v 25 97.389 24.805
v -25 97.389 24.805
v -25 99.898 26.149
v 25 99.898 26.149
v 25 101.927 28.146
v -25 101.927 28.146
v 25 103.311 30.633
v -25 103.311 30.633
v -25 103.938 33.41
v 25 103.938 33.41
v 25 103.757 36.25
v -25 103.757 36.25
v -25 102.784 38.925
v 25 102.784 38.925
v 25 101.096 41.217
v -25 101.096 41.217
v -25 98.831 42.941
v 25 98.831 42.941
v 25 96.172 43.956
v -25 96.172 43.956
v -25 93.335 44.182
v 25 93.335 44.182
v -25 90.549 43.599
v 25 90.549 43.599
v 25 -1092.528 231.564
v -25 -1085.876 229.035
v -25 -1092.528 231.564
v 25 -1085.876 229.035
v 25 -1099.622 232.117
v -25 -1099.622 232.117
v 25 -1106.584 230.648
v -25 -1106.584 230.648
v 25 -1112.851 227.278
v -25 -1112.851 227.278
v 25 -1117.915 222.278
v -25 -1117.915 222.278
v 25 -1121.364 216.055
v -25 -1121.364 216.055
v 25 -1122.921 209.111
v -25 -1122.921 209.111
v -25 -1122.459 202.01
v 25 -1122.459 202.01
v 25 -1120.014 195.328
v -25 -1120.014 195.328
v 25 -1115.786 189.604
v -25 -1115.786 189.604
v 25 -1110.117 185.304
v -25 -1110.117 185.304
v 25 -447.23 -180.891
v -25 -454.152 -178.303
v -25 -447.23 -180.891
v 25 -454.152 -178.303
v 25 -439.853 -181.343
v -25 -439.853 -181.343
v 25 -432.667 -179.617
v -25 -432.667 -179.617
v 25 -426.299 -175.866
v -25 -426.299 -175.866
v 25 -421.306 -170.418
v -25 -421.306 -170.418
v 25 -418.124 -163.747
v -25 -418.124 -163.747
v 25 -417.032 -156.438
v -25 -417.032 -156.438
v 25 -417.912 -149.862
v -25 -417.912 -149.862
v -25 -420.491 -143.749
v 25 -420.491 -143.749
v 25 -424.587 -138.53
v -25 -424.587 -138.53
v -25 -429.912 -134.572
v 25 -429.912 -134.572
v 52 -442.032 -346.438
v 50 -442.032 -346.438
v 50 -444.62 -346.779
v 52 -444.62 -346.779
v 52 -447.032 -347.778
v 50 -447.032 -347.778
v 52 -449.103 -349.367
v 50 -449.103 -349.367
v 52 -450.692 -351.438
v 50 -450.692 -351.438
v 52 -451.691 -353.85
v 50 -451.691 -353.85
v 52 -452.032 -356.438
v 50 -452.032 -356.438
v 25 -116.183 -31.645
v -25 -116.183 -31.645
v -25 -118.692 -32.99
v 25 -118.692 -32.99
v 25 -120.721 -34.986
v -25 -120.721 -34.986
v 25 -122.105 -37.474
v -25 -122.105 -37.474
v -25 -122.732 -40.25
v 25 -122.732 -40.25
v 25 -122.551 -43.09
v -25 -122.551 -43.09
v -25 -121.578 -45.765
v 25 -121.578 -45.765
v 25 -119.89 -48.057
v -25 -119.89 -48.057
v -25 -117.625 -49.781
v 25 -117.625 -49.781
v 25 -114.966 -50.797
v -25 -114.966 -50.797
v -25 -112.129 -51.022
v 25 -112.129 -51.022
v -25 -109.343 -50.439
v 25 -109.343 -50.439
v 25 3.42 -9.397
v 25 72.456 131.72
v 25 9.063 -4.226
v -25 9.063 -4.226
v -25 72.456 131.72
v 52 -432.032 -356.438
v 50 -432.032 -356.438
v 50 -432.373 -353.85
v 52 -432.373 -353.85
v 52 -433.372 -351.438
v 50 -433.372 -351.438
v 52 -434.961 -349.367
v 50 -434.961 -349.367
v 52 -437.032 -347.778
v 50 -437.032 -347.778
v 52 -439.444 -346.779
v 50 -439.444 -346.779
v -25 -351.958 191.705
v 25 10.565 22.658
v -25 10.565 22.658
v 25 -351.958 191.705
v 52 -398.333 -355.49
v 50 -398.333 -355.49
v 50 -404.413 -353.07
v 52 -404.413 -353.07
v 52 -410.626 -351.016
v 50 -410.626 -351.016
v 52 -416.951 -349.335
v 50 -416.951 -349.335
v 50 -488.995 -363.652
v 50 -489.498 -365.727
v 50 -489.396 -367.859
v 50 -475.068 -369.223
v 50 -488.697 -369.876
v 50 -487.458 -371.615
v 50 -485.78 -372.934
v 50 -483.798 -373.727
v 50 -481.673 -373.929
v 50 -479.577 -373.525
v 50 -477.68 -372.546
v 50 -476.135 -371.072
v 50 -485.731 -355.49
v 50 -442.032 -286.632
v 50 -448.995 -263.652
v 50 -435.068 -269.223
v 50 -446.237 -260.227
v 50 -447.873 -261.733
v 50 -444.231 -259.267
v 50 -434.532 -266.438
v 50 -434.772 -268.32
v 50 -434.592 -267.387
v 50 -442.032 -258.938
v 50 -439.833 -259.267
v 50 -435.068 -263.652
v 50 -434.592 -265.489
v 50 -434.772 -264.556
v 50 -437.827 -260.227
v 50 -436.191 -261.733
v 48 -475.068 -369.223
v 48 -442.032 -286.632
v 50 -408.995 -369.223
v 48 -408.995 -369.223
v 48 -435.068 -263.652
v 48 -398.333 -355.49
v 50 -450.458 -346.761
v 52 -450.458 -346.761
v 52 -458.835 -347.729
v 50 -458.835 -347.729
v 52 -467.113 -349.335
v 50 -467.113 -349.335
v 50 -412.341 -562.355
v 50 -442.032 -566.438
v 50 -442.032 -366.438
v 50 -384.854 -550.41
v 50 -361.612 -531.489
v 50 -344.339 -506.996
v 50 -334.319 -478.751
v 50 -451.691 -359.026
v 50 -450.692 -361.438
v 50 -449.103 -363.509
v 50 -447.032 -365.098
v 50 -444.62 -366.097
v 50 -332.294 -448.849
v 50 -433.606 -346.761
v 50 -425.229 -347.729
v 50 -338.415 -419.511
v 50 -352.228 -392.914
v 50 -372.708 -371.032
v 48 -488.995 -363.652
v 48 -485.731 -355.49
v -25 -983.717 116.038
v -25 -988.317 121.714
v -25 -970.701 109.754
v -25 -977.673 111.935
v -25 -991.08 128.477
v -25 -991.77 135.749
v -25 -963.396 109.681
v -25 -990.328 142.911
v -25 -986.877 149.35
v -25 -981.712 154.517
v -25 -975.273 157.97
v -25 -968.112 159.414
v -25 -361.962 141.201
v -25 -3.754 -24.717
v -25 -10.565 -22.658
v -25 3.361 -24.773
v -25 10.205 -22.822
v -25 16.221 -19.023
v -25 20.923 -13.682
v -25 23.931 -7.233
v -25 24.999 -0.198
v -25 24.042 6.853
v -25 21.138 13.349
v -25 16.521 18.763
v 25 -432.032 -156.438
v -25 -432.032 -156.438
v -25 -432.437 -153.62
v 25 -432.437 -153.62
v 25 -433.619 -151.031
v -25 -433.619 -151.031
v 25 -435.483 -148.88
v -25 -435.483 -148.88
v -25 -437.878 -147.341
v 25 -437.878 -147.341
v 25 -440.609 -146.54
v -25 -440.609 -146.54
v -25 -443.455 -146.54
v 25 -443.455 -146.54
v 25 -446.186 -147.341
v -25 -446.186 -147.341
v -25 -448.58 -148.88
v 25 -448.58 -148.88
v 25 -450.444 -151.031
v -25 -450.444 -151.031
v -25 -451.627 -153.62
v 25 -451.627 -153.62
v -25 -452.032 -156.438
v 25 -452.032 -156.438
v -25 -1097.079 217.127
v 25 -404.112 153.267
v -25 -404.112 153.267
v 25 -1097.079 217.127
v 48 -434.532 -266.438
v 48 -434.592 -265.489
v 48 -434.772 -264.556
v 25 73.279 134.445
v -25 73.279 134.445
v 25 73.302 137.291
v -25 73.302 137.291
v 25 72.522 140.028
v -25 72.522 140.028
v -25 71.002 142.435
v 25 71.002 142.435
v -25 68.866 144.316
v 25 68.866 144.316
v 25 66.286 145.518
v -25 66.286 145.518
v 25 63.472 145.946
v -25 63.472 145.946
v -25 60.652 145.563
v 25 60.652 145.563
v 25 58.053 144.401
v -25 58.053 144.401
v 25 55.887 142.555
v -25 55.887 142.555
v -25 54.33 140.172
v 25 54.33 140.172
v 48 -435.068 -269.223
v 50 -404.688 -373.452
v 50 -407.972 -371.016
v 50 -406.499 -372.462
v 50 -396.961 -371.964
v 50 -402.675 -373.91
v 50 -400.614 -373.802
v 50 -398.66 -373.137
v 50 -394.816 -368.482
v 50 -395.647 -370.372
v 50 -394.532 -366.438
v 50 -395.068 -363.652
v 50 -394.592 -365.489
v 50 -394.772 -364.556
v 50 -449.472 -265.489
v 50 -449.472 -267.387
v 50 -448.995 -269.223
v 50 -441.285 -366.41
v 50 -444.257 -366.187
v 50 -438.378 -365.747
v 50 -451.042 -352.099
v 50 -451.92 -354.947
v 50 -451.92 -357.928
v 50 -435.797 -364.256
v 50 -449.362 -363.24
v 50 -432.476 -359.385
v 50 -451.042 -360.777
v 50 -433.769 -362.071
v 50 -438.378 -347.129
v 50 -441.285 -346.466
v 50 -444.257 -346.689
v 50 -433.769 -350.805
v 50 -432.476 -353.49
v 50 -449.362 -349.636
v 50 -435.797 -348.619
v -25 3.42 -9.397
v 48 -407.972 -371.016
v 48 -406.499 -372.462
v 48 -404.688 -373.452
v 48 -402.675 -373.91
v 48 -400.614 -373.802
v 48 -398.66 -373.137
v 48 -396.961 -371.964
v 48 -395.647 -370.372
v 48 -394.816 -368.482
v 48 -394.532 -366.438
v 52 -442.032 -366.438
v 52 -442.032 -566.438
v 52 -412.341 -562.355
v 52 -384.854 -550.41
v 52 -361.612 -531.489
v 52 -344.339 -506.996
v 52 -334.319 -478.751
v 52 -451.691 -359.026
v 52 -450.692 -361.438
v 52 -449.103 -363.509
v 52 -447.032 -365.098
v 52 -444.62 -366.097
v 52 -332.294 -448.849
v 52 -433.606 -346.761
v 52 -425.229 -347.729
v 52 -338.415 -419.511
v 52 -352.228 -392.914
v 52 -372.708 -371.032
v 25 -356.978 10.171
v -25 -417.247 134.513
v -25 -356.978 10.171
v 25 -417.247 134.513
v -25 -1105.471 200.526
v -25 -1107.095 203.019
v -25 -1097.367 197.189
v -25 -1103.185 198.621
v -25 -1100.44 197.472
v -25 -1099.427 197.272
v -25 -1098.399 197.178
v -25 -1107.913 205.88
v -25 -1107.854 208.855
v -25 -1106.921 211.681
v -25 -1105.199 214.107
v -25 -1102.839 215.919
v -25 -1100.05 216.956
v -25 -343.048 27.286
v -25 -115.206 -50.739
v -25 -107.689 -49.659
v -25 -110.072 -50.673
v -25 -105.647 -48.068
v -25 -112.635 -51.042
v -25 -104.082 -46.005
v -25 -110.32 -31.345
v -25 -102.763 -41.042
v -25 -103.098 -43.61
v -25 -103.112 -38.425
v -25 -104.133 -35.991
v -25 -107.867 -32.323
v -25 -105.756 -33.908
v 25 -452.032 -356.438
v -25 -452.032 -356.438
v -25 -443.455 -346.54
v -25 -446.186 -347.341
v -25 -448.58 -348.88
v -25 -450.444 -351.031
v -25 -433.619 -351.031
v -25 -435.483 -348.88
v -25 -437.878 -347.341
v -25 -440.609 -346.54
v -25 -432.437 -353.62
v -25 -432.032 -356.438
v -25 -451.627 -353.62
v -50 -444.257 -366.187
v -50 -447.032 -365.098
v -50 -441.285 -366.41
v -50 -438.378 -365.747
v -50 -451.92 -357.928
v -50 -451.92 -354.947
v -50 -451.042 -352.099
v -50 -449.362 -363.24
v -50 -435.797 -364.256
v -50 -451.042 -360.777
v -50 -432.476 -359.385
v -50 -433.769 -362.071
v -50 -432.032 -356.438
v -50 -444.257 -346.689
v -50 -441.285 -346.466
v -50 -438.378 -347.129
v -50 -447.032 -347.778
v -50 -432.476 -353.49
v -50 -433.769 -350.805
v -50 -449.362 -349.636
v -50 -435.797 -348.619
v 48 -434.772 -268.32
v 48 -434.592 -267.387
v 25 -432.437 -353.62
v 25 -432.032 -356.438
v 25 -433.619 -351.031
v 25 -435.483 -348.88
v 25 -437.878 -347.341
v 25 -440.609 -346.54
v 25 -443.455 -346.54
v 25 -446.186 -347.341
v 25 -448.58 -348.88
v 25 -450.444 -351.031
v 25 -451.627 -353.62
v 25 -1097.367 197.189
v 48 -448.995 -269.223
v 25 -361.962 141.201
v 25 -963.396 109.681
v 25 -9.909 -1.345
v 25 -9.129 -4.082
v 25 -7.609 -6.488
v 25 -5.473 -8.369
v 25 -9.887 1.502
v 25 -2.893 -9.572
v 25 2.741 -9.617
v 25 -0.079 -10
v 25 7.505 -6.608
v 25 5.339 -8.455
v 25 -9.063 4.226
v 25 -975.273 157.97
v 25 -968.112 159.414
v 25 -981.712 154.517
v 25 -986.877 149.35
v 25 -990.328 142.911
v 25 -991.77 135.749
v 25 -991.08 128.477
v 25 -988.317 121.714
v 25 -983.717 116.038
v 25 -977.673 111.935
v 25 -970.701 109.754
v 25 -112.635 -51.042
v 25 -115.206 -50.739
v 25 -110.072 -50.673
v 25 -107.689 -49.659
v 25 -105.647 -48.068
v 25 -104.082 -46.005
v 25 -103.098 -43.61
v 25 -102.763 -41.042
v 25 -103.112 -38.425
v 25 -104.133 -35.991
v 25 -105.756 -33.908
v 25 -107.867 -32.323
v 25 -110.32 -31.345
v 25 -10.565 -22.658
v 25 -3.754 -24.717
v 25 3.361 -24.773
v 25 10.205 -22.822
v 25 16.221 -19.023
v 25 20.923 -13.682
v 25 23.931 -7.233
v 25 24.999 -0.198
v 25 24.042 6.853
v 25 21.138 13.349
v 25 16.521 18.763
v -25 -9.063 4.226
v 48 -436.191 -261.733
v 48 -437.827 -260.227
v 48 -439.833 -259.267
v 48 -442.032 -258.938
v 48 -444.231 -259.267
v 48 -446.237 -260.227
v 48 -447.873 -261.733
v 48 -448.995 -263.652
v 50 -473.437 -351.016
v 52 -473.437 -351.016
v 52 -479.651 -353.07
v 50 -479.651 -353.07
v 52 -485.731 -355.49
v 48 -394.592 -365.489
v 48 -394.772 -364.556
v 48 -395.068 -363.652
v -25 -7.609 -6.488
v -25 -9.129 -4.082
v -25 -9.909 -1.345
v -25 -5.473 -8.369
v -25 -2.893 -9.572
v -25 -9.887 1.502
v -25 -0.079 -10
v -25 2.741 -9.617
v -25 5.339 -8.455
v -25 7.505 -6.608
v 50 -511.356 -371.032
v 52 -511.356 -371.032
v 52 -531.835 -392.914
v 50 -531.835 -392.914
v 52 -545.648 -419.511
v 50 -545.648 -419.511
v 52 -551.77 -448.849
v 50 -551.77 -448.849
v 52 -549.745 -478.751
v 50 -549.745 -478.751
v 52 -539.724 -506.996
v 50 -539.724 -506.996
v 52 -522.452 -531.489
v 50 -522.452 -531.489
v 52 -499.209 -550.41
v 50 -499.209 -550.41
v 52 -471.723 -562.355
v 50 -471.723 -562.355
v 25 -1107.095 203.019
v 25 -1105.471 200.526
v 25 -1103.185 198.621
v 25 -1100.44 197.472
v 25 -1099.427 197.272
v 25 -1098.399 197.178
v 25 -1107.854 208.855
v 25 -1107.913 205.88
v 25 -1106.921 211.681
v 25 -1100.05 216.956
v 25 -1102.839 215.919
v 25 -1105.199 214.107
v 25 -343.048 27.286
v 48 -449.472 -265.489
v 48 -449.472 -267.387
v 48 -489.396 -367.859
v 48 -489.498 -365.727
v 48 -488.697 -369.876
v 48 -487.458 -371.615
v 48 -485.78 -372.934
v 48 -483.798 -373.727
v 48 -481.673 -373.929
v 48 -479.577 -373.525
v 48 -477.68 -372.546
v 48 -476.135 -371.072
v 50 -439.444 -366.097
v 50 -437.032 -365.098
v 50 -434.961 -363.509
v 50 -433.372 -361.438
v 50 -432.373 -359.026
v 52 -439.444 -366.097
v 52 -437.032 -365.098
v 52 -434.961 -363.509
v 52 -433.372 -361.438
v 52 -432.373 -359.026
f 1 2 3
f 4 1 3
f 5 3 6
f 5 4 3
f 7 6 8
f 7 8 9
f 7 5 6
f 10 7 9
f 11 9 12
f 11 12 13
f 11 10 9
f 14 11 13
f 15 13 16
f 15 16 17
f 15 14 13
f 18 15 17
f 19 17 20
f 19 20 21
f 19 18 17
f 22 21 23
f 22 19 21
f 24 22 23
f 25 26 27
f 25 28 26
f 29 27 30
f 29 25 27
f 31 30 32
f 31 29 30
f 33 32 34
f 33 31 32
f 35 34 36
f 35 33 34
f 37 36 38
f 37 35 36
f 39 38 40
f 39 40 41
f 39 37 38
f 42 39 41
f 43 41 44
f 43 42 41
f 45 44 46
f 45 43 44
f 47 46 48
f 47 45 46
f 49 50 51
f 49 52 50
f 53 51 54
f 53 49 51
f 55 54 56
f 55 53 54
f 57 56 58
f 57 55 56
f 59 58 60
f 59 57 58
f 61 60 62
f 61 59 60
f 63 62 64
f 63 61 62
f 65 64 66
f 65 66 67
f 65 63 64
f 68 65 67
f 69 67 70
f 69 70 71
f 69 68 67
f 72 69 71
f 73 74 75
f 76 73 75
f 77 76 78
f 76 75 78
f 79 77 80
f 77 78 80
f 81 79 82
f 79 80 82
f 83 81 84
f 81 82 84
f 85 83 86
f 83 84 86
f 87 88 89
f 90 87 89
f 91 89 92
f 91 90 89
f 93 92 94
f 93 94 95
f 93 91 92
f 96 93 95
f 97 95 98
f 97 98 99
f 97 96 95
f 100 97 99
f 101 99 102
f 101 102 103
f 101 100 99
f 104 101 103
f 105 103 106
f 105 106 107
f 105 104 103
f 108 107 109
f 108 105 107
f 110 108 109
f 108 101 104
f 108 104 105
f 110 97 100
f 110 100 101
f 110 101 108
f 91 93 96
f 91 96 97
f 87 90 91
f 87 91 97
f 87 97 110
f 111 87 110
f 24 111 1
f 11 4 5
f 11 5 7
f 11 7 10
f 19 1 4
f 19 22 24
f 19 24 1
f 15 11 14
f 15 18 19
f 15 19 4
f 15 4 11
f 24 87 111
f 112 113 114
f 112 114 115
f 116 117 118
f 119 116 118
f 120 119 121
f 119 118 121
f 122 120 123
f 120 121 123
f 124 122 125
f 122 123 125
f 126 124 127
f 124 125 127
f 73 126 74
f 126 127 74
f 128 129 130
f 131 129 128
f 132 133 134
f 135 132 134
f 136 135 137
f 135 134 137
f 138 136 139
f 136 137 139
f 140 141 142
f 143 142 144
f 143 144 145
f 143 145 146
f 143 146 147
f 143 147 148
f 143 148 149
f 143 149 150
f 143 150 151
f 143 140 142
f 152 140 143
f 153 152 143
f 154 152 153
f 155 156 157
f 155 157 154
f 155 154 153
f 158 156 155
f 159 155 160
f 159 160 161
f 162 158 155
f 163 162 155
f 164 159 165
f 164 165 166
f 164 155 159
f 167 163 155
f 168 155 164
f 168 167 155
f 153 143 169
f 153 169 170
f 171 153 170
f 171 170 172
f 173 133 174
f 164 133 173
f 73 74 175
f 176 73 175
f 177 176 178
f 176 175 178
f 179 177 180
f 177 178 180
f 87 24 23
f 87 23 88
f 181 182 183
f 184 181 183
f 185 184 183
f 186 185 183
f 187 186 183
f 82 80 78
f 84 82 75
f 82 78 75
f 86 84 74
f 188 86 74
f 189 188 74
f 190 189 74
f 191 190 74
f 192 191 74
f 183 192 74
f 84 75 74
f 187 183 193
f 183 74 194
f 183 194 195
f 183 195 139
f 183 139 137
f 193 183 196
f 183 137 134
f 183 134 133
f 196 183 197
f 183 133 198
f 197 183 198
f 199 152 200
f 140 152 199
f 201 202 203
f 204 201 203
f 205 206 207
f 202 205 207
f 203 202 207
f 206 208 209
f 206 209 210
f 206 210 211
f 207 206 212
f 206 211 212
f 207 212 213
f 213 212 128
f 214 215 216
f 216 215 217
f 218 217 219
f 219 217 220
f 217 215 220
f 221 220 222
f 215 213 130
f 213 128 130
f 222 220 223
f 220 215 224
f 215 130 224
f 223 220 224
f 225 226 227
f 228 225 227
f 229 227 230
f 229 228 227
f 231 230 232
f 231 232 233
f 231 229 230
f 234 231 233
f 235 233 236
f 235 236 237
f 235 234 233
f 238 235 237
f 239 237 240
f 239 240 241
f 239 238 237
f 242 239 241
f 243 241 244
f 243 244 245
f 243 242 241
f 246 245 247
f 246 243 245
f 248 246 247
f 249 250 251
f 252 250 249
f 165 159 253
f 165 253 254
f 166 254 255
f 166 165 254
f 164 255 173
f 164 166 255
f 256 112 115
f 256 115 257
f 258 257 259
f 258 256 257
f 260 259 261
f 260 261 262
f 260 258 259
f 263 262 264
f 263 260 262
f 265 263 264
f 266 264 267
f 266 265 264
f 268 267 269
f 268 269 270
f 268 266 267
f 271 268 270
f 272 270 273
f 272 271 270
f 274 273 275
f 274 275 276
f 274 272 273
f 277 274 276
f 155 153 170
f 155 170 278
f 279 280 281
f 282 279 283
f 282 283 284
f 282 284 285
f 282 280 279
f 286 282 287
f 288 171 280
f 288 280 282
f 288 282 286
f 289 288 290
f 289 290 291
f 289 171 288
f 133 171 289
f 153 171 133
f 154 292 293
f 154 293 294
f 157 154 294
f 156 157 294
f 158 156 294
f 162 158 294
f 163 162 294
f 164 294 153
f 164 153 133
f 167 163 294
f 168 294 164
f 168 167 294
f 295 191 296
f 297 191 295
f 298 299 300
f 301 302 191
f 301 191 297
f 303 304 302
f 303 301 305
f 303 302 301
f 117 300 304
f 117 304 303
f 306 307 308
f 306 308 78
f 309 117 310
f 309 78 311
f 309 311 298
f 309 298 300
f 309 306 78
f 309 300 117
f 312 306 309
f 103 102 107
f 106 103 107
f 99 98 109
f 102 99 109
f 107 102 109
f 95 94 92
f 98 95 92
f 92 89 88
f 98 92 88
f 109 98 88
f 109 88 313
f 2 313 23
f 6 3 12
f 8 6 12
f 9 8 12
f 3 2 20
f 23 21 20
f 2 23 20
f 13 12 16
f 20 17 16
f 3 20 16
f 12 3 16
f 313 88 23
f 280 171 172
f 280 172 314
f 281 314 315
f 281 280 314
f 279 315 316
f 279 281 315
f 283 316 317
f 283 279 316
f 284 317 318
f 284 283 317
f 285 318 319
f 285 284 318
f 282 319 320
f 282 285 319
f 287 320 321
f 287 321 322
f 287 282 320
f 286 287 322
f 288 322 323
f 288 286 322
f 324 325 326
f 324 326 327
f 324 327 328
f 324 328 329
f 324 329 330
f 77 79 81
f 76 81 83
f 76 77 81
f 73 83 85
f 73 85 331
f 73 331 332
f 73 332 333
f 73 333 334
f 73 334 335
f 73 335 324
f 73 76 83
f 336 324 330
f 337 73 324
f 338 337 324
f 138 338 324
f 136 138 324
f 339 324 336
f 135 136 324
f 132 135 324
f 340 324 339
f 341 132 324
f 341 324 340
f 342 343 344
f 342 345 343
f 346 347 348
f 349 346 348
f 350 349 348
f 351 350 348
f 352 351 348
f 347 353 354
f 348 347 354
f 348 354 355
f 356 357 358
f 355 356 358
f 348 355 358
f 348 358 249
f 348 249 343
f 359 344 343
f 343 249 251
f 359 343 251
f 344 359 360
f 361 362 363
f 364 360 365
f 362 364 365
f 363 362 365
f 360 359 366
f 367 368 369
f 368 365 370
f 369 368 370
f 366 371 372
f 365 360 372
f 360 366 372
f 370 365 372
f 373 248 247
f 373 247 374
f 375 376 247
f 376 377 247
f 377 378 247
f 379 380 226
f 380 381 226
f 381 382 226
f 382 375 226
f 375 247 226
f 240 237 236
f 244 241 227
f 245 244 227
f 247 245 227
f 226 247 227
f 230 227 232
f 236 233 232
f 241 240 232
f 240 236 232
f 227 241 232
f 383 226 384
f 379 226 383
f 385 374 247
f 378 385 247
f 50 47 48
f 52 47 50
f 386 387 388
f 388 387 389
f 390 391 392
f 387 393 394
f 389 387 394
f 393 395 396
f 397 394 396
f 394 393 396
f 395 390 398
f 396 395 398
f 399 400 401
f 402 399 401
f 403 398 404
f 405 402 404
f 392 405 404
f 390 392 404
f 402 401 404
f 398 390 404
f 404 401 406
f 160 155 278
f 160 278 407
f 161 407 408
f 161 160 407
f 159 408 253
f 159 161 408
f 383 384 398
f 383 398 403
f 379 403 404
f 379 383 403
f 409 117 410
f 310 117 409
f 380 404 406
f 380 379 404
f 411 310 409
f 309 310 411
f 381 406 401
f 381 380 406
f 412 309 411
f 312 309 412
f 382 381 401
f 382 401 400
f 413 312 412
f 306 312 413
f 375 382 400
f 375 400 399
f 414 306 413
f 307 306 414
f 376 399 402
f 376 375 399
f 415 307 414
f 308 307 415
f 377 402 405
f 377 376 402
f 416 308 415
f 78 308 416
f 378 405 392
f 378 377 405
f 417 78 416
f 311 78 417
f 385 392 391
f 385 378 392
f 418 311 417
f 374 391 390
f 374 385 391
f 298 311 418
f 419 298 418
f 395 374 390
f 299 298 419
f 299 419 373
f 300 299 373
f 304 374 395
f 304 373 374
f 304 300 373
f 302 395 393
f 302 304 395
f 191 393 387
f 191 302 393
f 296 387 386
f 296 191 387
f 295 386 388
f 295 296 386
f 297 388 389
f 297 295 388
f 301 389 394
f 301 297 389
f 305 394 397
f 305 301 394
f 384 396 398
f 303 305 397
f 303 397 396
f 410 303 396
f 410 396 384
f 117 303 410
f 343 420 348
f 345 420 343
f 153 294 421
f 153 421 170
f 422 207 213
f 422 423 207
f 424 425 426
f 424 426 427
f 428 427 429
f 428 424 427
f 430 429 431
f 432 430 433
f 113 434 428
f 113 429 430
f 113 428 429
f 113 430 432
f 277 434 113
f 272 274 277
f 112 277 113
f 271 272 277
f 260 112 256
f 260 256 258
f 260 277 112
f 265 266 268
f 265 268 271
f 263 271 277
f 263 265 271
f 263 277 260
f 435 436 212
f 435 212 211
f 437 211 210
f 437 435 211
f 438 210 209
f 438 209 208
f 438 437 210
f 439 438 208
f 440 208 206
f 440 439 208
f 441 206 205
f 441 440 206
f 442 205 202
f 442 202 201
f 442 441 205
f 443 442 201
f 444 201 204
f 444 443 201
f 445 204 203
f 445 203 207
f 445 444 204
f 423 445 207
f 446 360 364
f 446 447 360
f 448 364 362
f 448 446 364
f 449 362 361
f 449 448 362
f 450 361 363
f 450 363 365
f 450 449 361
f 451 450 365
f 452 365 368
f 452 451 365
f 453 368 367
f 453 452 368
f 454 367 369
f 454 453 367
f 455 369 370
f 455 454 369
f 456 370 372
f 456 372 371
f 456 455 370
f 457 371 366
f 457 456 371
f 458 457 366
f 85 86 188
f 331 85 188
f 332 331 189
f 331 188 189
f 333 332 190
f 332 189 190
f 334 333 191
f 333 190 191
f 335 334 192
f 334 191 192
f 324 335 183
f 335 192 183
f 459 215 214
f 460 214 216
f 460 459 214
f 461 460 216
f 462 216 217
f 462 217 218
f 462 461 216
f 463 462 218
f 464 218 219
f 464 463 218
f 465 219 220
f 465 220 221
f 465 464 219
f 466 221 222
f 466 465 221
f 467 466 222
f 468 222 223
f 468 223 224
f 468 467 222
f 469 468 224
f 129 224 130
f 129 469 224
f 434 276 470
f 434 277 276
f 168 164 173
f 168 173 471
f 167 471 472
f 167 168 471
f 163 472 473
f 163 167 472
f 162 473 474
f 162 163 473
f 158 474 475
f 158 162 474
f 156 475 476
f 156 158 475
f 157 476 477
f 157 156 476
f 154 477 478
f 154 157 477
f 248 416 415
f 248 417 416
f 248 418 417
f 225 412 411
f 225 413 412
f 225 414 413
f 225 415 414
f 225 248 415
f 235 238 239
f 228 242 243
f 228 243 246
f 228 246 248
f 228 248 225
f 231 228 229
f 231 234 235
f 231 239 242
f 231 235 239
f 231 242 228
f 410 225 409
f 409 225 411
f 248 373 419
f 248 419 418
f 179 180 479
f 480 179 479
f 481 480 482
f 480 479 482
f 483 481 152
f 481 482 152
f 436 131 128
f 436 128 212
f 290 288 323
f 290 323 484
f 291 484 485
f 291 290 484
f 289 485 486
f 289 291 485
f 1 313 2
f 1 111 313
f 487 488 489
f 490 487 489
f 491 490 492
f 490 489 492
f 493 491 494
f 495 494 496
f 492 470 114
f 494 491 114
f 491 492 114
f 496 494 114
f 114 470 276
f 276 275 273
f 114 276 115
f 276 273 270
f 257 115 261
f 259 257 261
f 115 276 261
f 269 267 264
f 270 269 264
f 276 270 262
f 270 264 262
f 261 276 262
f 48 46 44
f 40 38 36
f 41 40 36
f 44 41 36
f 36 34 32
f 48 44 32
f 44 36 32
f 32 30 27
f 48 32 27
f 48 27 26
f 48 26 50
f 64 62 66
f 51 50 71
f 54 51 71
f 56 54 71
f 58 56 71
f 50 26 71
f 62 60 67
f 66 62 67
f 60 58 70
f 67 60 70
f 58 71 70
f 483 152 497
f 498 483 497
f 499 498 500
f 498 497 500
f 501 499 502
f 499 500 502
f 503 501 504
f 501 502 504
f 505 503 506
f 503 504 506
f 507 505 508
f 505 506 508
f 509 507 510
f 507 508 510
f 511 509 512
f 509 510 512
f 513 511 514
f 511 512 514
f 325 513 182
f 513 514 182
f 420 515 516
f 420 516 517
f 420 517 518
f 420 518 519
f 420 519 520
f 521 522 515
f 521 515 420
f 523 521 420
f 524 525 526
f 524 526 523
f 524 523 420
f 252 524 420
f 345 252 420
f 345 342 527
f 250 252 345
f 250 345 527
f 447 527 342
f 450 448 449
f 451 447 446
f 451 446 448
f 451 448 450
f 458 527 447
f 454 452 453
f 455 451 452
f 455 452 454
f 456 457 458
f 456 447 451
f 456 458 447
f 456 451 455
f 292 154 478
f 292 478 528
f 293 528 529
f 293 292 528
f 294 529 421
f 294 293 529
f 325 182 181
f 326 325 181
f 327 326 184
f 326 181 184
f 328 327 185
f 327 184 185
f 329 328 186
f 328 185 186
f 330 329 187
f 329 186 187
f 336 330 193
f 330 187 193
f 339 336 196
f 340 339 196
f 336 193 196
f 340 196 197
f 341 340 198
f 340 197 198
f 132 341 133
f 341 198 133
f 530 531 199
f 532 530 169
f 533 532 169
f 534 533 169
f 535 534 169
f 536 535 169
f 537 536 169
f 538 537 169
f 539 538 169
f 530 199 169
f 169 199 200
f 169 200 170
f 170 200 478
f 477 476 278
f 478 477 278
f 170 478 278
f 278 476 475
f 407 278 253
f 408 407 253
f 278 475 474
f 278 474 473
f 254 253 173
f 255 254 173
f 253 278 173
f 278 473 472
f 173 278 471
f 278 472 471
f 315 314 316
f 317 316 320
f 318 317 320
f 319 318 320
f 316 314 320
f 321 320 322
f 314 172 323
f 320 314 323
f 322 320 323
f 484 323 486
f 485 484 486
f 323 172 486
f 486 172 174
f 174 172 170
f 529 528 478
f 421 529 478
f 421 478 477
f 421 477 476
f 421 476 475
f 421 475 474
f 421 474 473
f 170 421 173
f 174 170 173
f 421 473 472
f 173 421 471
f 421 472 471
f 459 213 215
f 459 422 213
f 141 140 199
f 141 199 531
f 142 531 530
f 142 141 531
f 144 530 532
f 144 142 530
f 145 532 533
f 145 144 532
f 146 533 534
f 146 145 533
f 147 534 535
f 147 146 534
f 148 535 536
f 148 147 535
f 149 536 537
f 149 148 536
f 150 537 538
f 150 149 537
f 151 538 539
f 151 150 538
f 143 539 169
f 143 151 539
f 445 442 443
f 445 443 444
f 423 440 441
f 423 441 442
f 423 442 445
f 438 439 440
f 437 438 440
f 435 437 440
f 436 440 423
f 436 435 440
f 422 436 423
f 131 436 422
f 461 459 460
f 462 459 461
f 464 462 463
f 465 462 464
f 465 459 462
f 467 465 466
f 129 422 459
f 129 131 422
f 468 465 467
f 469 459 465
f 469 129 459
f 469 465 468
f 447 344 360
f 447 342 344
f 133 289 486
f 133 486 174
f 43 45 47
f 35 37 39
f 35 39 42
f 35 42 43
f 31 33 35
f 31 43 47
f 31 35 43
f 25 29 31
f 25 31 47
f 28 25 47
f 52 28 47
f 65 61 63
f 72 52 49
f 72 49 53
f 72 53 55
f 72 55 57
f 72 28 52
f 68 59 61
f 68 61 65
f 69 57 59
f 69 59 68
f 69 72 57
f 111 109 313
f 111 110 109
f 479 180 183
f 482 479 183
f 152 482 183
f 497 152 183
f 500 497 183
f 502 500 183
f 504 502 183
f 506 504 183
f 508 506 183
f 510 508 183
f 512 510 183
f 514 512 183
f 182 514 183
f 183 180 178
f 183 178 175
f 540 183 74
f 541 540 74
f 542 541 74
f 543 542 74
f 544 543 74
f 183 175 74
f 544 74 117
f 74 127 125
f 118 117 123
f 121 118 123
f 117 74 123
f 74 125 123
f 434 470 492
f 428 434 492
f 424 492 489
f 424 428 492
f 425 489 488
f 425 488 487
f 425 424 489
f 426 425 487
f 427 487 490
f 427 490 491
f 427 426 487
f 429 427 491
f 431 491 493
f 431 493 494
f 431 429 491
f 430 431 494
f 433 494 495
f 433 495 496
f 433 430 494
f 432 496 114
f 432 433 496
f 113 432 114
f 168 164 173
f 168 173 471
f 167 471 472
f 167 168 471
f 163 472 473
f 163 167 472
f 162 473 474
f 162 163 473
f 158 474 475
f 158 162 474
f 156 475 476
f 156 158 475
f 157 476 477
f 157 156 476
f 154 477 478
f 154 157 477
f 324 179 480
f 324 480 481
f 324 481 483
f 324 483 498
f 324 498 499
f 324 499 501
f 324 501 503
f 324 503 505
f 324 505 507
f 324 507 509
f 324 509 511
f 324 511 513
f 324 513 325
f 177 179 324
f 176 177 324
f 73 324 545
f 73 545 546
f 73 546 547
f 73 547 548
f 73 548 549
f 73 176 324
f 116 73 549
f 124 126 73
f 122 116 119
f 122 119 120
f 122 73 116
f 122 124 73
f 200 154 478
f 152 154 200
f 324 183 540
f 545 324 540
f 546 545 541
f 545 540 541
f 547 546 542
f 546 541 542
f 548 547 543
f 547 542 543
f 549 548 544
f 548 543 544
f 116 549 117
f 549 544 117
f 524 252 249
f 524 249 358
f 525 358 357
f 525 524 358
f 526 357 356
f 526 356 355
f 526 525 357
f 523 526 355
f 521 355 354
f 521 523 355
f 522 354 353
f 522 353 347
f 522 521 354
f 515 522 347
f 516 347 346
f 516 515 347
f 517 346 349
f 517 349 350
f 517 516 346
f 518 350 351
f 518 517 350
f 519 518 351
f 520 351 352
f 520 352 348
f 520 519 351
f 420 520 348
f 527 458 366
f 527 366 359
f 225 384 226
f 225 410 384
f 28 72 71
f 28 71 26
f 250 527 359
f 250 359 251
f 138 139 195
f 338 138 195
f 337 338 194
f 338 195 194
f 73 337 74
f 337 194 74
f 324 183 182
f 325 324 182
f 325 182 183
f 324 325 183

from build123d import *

# Parameters (mm, degrees)
F4_DEPTH  = 25
F5_DEPTH  = 25
F6_DEPTH  = 25
F7_DEPTH  = 25
F9_DEPTH  = 25
F11_DEPTH = 25
F12_DEPTH = 50
F14_DEPTH = 2
F15_DEPTH = 2
F16_DEPTH = 2
F17_DEPTH = 2


with BuildPart() as f4:
    # F0 (on Right) → F4 (new body, symmetric)
    with BuildSketch(Plane.YZ):
        with BuildLine():
            ThreePointArc((-10.5654565435, -22.6576946759), (13.4324902087, -21.0847861453), (25, 0))
            ThreePointArc((25, 0), (21.0847861453, 13.4324902087), (10.5654565435, 22.6576946759))
            ThreePointArc((10.5654565435, 22.6576946759), (-22.6576946759, 10.5654565435), (-10.5654565435, -22.6576946759))
        make_face()
        with BuildLine():
            ThreePointArc((-10.5654565435, -22.6576946759), (-22.6576946759, 10.5654565435), (10.5654565435, 22.6576946759))
            Line((10.5654565435, 22.6576946759), (-351.9576582711, 191.7049993722))
            Line((-351.9576582711, 191.7049993722), (-361.9619242348, 141.2011692572))
            Line((-361.9619242348, 141.2011692572), (-10.5654565435, -22.6576946759))
        make_face()
        with BuildLine():
            Line((-361.9619242348, 141.2011692572), (-351.9576582711, 191.7049993722))
            Line((-351.9576582711, 191.7049993722), (-968.1120812147, 159.4137143703))
            ThreePointArc((-968.1120812147, 159.4137143703), (-991.6920086499, 132.0876345158), (-963.3955999376, 109.6813659275))
            Line((-963.3955999376, 109.6813659275), (-361.9619242348, 141.2011692572))
        make_face()
    extrude(amount=F4_DEPTH, both=True)


with BuildPart() as f5:
    # F1 (on Right) → F5 (new body, symmetric)
    with BuildSketch(Plane.YZ):
        with BuildLine():
            ThreePointArc((-454.1520985312, -178.3032888249), (-429.343398951, -177.9785251574), (-417.031858025, -156.4377961464))
            ThreePointArc((-417.031858025, -156.4377961464), (-420.491129014, -143.7493370723), (-429.9116175188, -134.5723034679))
            ThreePointArc((-429.9116175188, -134.5723034679), (-463.8973507035, -144.3175556402), (-454.1520985312, -178.3032888249))
        make_face()
        with BuildLine():
            ThreePointArc((-454.1520985312, -178.3032888249), (-463.8973507035, -144.3175556402), (-429.9116175188, -134.5723034679))
            Line((-429.9116175188, -134.5723034679), (-954.6834418025, 156.3134686799))
            ThreePointArc((-954.6834418025, 156.3134686799), (-945.2629532976, 147.1364350755), (-941.8036823086, 134.4479760014))
            ThreePointArc((-941.8036823086, 134.4479760014), (-954.1152232346, 112.9072469904), (-978.9239228148, 112.582483323))
            Line((-978.9239228148, 112.582483323), (-454.1520985312, -178.3032888249))
        make_face()
        with BuildLine():
            ThreePointArc((-978.9239228148, 112.582483323), (-988.6691749871, 146.5682165076), (-954.6834418025, 156.3134686799))
            Line((-954.6834418025, 156.3134686799), (-1085.8763978734, 229.0349117169))
            ThreePointArc((-1085.8763978734, 229.0349117169), (-1119.862131058, 219.2896595445), (-1110.1168788857, 185.3039263599))
            Line((-1110.1168788857, 185.3039263599), (-978.9239228148, 112.582483323))
        make_face()
        with BuildLine():
            ThreePointArc((-941.8036823086, 134.4479760014), (-945.2629532976, 147.1364350755), (-954.6834418025, 156.3134686799))
            ThreePointArc((-954.6834418025, 156.3134686799), (-988.6691749871, 146.5682165076), (-978.9239228148, 112.582483323))
            ThreePointArc((-978.9239228148, 112.582483323), (-954.1152232346, 112.9072469904), (-941.8036823086, 134.4479760014))
        make_face()
    extrude(amount=F5_DEPTH, both=True)


with BuildPart() as f6:
    # F2 (on Right) → F6 (new body, symmetric)
    with BuildSketch(Plane.YZ):
        with BuildLine():
            ThreePointArc((3.4202014333, -9.3969262079), (8.1915204429, -5.7357643635), (10, 0))
            ThreePointArc((10, 0), (5.7357643635, 8.1915204429), (-3.4202014333, 9.3969262079))
            ThreePointArc((-3.4202014333, 9.3969262079), (-9.3969262079, -3.4202014333), (3.4202014333, -9.3969262079))
        make_face()
        with BuildLine():
            ThreePointArc((-3.4202014333, 9.3969262079), (5.7357643635, 8.1915204429), (10, 0))
            ThreePointArc((10, 0), (8.1915204429, -5.7357643635), (3.4202014333, -9.3969262079))
            Line((3.4202014333, -9.3969262079), (97.3894635118, 24.8050881247))
            ThreePointArc((97.3894635118, 24.8050881247), (103.3661882864, 37.6222157658), (90.5490606453, 43.5989405404))
            Line((90.5490606453, 43.5989405404), (-3.4202014333, 9.3969262079))
        make_face()
        with BuildLine():
            ThreePointArc((3.4202014333, -9.3969262079), (-9.3969262079, -3.4202014333), (-3.4202014333, 9.3969262079))
            Line((-3.4202014333, 9.3969262079), (-116.1833159276, -31.6454909912))
            ThreePointArc((-116.1833159276, -31.6454909912), (-122.1600407022, -44.4626186323), (-109.3429130611, -50.4393434069))
            Line((-109.3429130611, -50.4393434069), (3.4202014333, -9.3969262079))
        make_face()
    extrude(amount=F6_DEPTH, both=True)


with BuildPart() as f7:
    # F3 (on Right) → F7 (new body, symmetric)
    with BuildSketch(Plane.YZ):
        with BuildLine():
            ThreePointArc((-115.2060991615, -50.7394180713), (-106.6161577949, -48.9300609116), (-102.7631144943, -41.0424171991))
            ThreePointArc((-102.7631144943, -41.0424171991), (-104.8754707818, -34.8954604997), (-110.3201298271, -31.3454163269))
            ThreePointArc((-110.3201298271, -31.3454163269), (-122.4601153665, -38.5994325319), (-115.2060991615, -50.7394180713))
        make_face()
        with BuildLine():
            ThreePointArc((-115.2060991615, -50.7394180713), (-122.4601153665, -38.5994325319), (-110.3201298271, -31.3454163269))
            Line((-110.3201298271, -31.3454163269), (-343.0481507602, 27.2862156865))
            Line((-343.0481507602, 27.2862156865), (-404.1116313197, 153.2673703961))
            Line((-404.1116313197, 153.2673703961), (-1097.0789846366, 217.1272256045))
            ThreePointArc((-1097.0789846366, 217.1272256045), (-1090.6082509564, 213.9082417312), (-1087.9966383796, 207.1694190384))
            ThreePointArc((-1087.9966383796, 207.1694190384), (-1090.7063531266, 200.3245858826), (-1097.3669865658, 197.1892617955))
            Line((-1097.3669865658, 197.1892617955), (-417.2470419466, 134.5133493158))
            Line((-417.2470419466, 134.5133493158), (-356.9776916303, 10.1705788603))
            Line((-356.9776916303, 10.1705788603), (-115.2060991615, -50.7394180713))
        make_face()
        with BuildLine():
            ThreePointArc((-1087.9966383796, 207.1694190384), (-1090.6082509564, 213.9082417312), (-1097.0789846366, 217.1272256045))
            ThreePointArc((-1097.0789846366, 217.1272256045), (-1107.8535913807, 208.8547906691), (-1100.4396230468, 197.4724181662))
            Line((-1100.4396230468, 197.4724181662), (-1097.3669865658, 197.1892617955))
            ThreePointArc((-1097.3669865658, 197.1892617955), (-1090.7063531266, 200.3245858826), (-1087.9966383796, 207.1694190384))
        make_face()
        with BuildLine():
            ThreePointArc((-1100.4396230468, 197.4724181662), (-1098.9142921225, 197.2116124723), (-1097.3669865658, 197.1892617955))
            Line((-1097.3669865658, 197.1892617955), (-1100.4396230468, 197.4724181662))
        make_face()
    extrude(amount=F7_DEPTH, both=True)


with BuildPart() as f9:
    # F8 (on Right) → F9 (new body, symmetric)
    with BuildSketch(Plane.YZ):
        with BuildLine():
            ThreePointArc((9.0630778704, -4.2261826174), (9.7629600712, -2.1643961394), (10, 0))
            ThreePointArc((10, 0), (2.1643961394, 9.7629600712), (-9.0630778704, 4.2261826174))
            ThreePointArc((-9.0630778704, 4.2261826174), (-4.2261826174, -9.0630778704), (9.0630778704, -4.2261826174))
        make_face()
        with BuildLine():
            ThreePointArc((-9.0630778704, 4.2261826174), (2.1643961394, 9.7629600712), (10, 0))
            ThreePointArc((10, 0), (9.7629600712, -2.1643961394), (9.0630778704, -4.2261826174))
            Line((9.0630778704, -4.2261826174), (72.4558171315, 131.7199854381))
            ThreePointArc((72.4558171315, 131.7199854381), (67.6189218785, 145.0092459259), (54.3296613907, 140.1723506729))
            Line((54.3296613907, 140.1723506729), (-9.0630778704, 4.2261826174))
        make_face()
    extrude(amount=F9_DEPTH, both=True)


with BuildPart() as f11:
    # F10 (on Right) → F11 (new body, symmetric)
    with BuildSketch(Plane.YZ):
        with BuildLine():
            Line((-432.031858025, -356.4377961464), (-432.031858025, -156.4377961464))
            ThreePointArc((-432.031858025, -156.4377961464), (-442.031858025, -166.4377961464), (-452.031858025, -156.4377961464))
            Line((-452.031858025, -156.4377961464), (-452.031858025, -356.4377961464))
            ThreePointArc((-452.031858025, -356.4377961464), (-442.031858025, -346.4377961464), (-432.031858025, -356.4377961464))
        make_face()
        with BuildLine():
            ThreePointArc((-452.031858025, -356.4377961464), (-442.031858025, -366.4377961464), (-432.031858025, -356.4377961464))
            ThreePointArc((-432.031858025, -356.4377961464), (-442.031858025, -346.4377961464), (-452.031858025, -356.4377961464))
        make_face()
        with BuildLine():
            ThreePointArc((-452.031858025, -156.4377961464), (-442.031858025, -166.4377961464), (-432.031858025, -156.4377961464))
            ThreePointArc((-432.031858025, -156.4377961464), (-442.031858025, -146.4377961464), (-452.031858025, -156.4377961464))
        make_face()
    extrude(amount=F11_DEPTH, both=True)

    # F10 (on Right) → F12 (join, symmetric)
    with BuildSketch(Plane.YZ):
        with BuildLine():
            ThreePointArc((-452.031858025, -356.4377961464), (-442.031858025, -366.4377961464), (-432.031858025, -356.4377961464))
            ThreePointArc((-432.031858025, -356.4377961464), (-442.031858025, -346.4377961464), (-452.031858025, -356.4377961464))
        make_face()
    extrude(amount=F12_DEPTH, both=True)


with BuildPart() as f14:
    # F13 (on face) → F14 (new body)
    with BuildSketch(Plane.YZ.offset(50)):
        with BuildLine():
            ThreePointArc((-452.031858025, -356.4377961464), (-449.1029258369, -349.3667283345), (-442.031858025, -346.4377961464))
            ThreePointArc((-442.031858025, -346.4377961464), (-454.6559095951, -347.1645911876), (-467.1131412001, -349.3353721108))
            Line((-467.1131412001, -349.3353721108), (-475.0682828434, -369.223226219))
            ThreePointArc((-475.0682828434, -369.223226219), (-484.8172880977, -373.401371328), (-488.9954332066, -363.6523660737))
            Line((-488.9954332066, -363.6523660737), (-485.7305531536, -355.4901659411))
            ThreePointArc((-485.7305531536, -355.4901659411), (-549.7449939987, -478.7510285144), (-442.031858025, -566.4377961464))
            Line((-442.031858025, -566.4377961464), (-442.031858025, -366.4377961464))
            ThreePointArc((-442.031858025, -366.4377961464), (-449.1029258369, -363.5088639582), (-452.031858025, -356.4377961464))
        make_face()
        with BuildLine():
            ThreePointArc((-442.031858025, -366.4377961464), (-434.9607902131, -363.5088639582), (-432.031858025, -356.4377961464))
            ThreePointArc((-432.031858025, -356.4377961464), (-434.9607902131, -349.3667283345), (-442.031858025, -346.4377961464))
            ThreePointArc((-442.031858025, -346.4377961464), (-449.1029258369, -349.3667283345), (-452.031858025, -356.4377961464))
            ThreePointArc((-452.031858025, -356.4377961464), (-449.1029258369, -363.5088639582), (-442.031858025, -366.4377961464))
        make_face()
        with BuildLine():
            ThreePointArc((-488.9954332066, -363.6523660737), (-484.8172880977, -373.401371328), (-475.0682828434, -369.223226219))
            ThreePointArc((-475.0682828434, -369.223226219), (-474.6671851245, -367.856102555), (-474.531858025, -366.4377961464))
            ThreePointArc((-474.531858025, -366.4377961464), (-480.6135516163, -359.0731232459), (-488.9954332066, -363.6523660737))
        make_face()
        with BuildLine():
            Line((-475.0682828434, -369.223226219), (-467.1131412001, -349.3353721108))
            ThreePointArc((-467.1131412001, -349.3353721108), (-476.5592634537, -351.9971035292), (-485.7305531536, -355.4901659411))
            Line((-485.7305531536, -355.4901659411), (-488.9954332066, -363.6523660737))
            ThreePointArc((-488.9954332066, -363.6523660737), (-480.6135516163, -359.0731232459), (-474.531858025, -366.4377961464))
            ThreePointArc((-474.531858025, -366.4377961464), (-474.6671851245, -367.856102555), (-475.0682828434, -369.223226219))
        make_face()
    extrude(amount=F14_DEPTH)


with BuildPart() as f15:
    # F13 (on face) → F15 (new body)
    with BuildSketch(Plane.YZ.offset(50)):
        with BuildLine():
            ThreePointArc((-442.031858025, -346.4377961464), (-434.9607902131, -349.3667283345), (-432.031858025, -356.4377961464))
            ThreePointArc((-432.031858025, -356.4377961464), (-434.9607902131, -363.5088639582), (-442.031858025, -366.4377961464))
            Line((-442.031858025, -366.4377961464), (-442.031858025, -566.4377961464))
            ThreePointArc((-442.031858025, -566.4377961464), (-334.3187220513, -478.7510285144), (-398.3331628964, -355.4901659411))
            Line((-398.3331628964, -355.4901659411), (-395.0682828434, -363.6523660737))
            ThreePointArc((-395.0682828434, -363.6523660737), (-394.6671851245, -365.0194897377), (-394.531858025, -366.4377961464))
            ThreePointArc((-394.531858025, -366.4377961464), (-400.6135516163, -373.8024690469), (-408.9954332066, -369.223226219))
            Line((-408.9954332066, -369.223226219), (-416.9505748499, -349.3353721108))
            ThreePointArc((-416.9505748499, -349.3353721108), (-429.4078064549, -347.1645911876), (-442.031858025, -346.4377961464))
        make_face()
        with BuildLine():
            ThreePointArc((-442.031858025, -366.4377961464), (-434.9607902131, -363.5088639582), (-432.031858025, -356.4377961464))
            ThreePointArc((-432.031858025, -356.4377961464), (-434.9607902131, -349.3667283345), (-442.031858025, -346.4377961464))
            ThreePointArc((-442.031858025, -346.4377961464), (-449.1029258369, -349.3667283345), (-452.031858025, -356.4377961464))
            ThreePointArc((-452.031858025, -356.4377961464), (-449.1029258369, -363.5088639582), (-442.031858025, -366.4377961464))
        make_face()
        with BuildLine():
            ThreePointArc((-395.0682828434, -363.6523660737), (-404.8172880977, -359.4742209647), (-408.9954332066, -369.223226219))
            ThreePointArc((-408.9954332066, -369.223226219), (-400.6135516163, -373.8024690469), (-394.531858025, -366.4377961464))
            ThreePointArc((-394.531858025, -366.4377961464), (-394.6671851245, -365.0194897377), (-395.0682828434, -363.6523660737))
        make_face()
        with BuildLine():
            ThreePointArc((-398.3331628964, -355.4901659411), (-407.5044525963, -351.9971035292), (-416.9505748499, -349.3353721108))
            Line((-416.9505748499, -349.3353721108), (-408.9954332066, -369.223226219))
            ThreePointArc((-408.9954332066, -369.223226219), (-404.8172880977, -359.4742209647), (-395.0682828434, -363.6523660737))
            Line((-395.0682828434, -363.6523660737), (-398.3331628964, -355.4901659411))
        make_face()
    extrude(amount=F15_DEPTH)


with BuildPart() as f16:
    # F13 (on face) → F16 (new body)
    with BuildSketch(Plane.YZ.offset(50)):
        with BuildLine():
            ThreePointArc((-488.9954332066, -363.6523660737), (-484.8172880977, -373.401371328), (-475.0682828434, -369.223226219))
            ThreePointArc((-475.0682828434, -369.223226219), (-474.6671851245, -367.856102555), (-474.531858025, -366.4377961464))
            ThreePointArc((-474.531858025, -366.4377961464), (-480.6135516163, -359.0731232459), (-488.9954332066, -363.6523660737))
        make_face()
        with BuildLine():
            Line((-475.0682828434, -369.223226219), (-467.1131412001, -349.3353721108))
            ThreePointArc((-467.1131412001, -349.3353721108), (-476.5592634537, -351.9971035292), (-485.7305531536, -355.4901659411))
            Line((-485.7305531536, -355.4901659411), (-488.9954332066, -363.6523660737))
            ThreePointArc((-488.9954332066, -363.6523660737), (-480.6135516163, -359.0731232459), (-474.531858025, -366.4377961464))
            ThreePointArc((-474.531858025, -366.4377961464), (-474.6671851245, -367.856102555), (-475.0682828434, -369.223226219))
        make_face()
        with BuildLine():
            ThreePointArc((-485.7305531536, -355.4901659411), (-476.5592634537, -351.9971035292), (-467.1131412001, -349.3353721108))
            Line((-467.1131412001, -349.3353721108), (-442.031858025, -286.6321641731))
            Line((-442.031858025, -286.6321641731), (-448.9954332066, -269.223226219))
            ThreePointArc((-448.9954332066, -269.223226219), (-449.531858025, -266.4377961464), (-448.9954332066, -263.6523660737))
            Line((-448.9954332066, -263.6523660737), (-485.7305531536, -355.4901659411))
        make_face()
        with BuildLine():
            ThreePointArc((-434.531858025, -266.4377961464), (-434.6671851245, -265.0194897377), (-435.0682828434, -263.6523660737))
            ThreePointArc((-435.0682828434, -263.6523660737), (-442.031858025, -258.9377961464), (-448.9954332066, -263.6523660737))
            ThreePointArc((-448.9954332066, -263.6523660737), (-449.531858025, -266.4377961464), (-448.9954332066, -269.223226219))
            ThreePointArc((-448.9954332066, -269.223226219), (-442.031858025, -273.9377961464), (-435.0682828434, -269.223226219))
            ThreePointArc((-435.0682828434, -269.223226219), (-434.6671851245, -267.856102555), (-434.531858025, -266.4377961464))
        make_face()
        with BuildLine():
            Line((-448.9954332066, -269.223226219), (-442.031858025, -286.6321641731))
            Line((-442.031858025, -286.6321641731), (-435.0682828434, -269.223226219))
            ThreePointArc((-435.0682828434, -269.223226219), (-442.031858025, -273.9377961464), (-448.9954332066, -269.223226219))
        make_face()
    extrude(amount=-F16_DEPTH)


with BuildPart() as f17:
    # F13 (on face) → F17 (new body)
    with BuildSketch(Plane.YZ.offset(50)):
        with BuildLine():
            ThreePointArc((-395.0682828434, -363.6523660737), (-404.8172880977, -359.4742209647), (-408.9954332066, -369.223226219))
            ThreePointArc((-408.9954332066, -369.223226219), (-400.6135516163, -373.8024690469), (-394.531858025, -366.4377961464))
            ThreePointArc((-394.531858025, -366.4377961464), (-394.6671851245, -365.0194897377), (-395.0682828434, -363.6523660737))
        make_face()
        with BuildLine():
            Line((-442.031858025, -286.6321641731), (-416.9505748499, -349.3353721108))
            ThreePointArc((-416.9505748499, -349.3353721108), (-407.5044525963, -351.9971035292), (-398.3331628964, -355.4901659411))
            Line((-398.3331628964, -355.4901659411), (-435.0682828434, -263.6523660737))
            ThreePointArc((-435.0682828434, -263.6523660737), (-434.6671851245, -265.0194897377), (-434.531858025, -266.4377961464))
            ThreePointArc((-434.531858025, -266.4377961464), (-434.6671851245, -267.856102555), (-435.0682828434, -269.223226219))
            Line((-435.0682828434, -269.223226219), (-442.031858025, -286.6321641731))
        make_face()
        with BuildLine():
            ThreePointArc((-398.3331628964, -355.4901659411), (-407.5044525963, -351.9971035292), (-416.9505748499, -349.3353721108))
            Line((-416.9505748499, -349.3353721108), (-408.9954332066, -369.223226219))
            ThreePointArc((-408.9954332066, -369.223226219), (-404.8172880977, -359.4742209647), (-395.0682828434, -363.6523660737))
            Line((-395.0682828434, -363.6523660737), (-398.3331628964, -355.4901659411))
        make_face()
        with BuildLine():
            Line((-448.9954332066, -269.223226219), (-442.031858025, -286.6321641731))
            Line((-442.031858025, -286.6321641731), (-435.0682828434, -269.223226219))
            ThreePointArc((-435.0682828434, -269.223226219), (-442.031858025, -273.9377961464), (-448.9954332066, -269.223226219))
        make_face()
        with BuildLine():
            ThreePointArc((-434.531858025, -266.4377961464), (-434.6671851245, -265.0194897377), (-435.0682828434, -263.6523660737))
            ThreePointArc((-435.0682828434, -263.6523660737), (-442.031858025, -258.9377961464), (-448.9954332066, -263.6523660737))
            ThreePointArc((-448.9954332066, -263.6523660737), (-449.531858025, -266.4377961464), (-448.9954332066, -269.223226219))
            ThreePointArc((-448.9954332066, -269.223226219), (-442.031858025, -273.9377961464), (-435.0682828434, -269.223226219))
            ThreePointArc((-435.0682828434, -269.223226219), (-434.6671851245, -267.856102555), (-434.531858025, -266.4377961464))
        make_face()
    extrude(amount=-F17_DEPTH)


solid = Compound([f4.part, f5.part, f6.part, f7.part, f9.part, f11.part, f14.part, f15.part, f16.part, f17.part])
